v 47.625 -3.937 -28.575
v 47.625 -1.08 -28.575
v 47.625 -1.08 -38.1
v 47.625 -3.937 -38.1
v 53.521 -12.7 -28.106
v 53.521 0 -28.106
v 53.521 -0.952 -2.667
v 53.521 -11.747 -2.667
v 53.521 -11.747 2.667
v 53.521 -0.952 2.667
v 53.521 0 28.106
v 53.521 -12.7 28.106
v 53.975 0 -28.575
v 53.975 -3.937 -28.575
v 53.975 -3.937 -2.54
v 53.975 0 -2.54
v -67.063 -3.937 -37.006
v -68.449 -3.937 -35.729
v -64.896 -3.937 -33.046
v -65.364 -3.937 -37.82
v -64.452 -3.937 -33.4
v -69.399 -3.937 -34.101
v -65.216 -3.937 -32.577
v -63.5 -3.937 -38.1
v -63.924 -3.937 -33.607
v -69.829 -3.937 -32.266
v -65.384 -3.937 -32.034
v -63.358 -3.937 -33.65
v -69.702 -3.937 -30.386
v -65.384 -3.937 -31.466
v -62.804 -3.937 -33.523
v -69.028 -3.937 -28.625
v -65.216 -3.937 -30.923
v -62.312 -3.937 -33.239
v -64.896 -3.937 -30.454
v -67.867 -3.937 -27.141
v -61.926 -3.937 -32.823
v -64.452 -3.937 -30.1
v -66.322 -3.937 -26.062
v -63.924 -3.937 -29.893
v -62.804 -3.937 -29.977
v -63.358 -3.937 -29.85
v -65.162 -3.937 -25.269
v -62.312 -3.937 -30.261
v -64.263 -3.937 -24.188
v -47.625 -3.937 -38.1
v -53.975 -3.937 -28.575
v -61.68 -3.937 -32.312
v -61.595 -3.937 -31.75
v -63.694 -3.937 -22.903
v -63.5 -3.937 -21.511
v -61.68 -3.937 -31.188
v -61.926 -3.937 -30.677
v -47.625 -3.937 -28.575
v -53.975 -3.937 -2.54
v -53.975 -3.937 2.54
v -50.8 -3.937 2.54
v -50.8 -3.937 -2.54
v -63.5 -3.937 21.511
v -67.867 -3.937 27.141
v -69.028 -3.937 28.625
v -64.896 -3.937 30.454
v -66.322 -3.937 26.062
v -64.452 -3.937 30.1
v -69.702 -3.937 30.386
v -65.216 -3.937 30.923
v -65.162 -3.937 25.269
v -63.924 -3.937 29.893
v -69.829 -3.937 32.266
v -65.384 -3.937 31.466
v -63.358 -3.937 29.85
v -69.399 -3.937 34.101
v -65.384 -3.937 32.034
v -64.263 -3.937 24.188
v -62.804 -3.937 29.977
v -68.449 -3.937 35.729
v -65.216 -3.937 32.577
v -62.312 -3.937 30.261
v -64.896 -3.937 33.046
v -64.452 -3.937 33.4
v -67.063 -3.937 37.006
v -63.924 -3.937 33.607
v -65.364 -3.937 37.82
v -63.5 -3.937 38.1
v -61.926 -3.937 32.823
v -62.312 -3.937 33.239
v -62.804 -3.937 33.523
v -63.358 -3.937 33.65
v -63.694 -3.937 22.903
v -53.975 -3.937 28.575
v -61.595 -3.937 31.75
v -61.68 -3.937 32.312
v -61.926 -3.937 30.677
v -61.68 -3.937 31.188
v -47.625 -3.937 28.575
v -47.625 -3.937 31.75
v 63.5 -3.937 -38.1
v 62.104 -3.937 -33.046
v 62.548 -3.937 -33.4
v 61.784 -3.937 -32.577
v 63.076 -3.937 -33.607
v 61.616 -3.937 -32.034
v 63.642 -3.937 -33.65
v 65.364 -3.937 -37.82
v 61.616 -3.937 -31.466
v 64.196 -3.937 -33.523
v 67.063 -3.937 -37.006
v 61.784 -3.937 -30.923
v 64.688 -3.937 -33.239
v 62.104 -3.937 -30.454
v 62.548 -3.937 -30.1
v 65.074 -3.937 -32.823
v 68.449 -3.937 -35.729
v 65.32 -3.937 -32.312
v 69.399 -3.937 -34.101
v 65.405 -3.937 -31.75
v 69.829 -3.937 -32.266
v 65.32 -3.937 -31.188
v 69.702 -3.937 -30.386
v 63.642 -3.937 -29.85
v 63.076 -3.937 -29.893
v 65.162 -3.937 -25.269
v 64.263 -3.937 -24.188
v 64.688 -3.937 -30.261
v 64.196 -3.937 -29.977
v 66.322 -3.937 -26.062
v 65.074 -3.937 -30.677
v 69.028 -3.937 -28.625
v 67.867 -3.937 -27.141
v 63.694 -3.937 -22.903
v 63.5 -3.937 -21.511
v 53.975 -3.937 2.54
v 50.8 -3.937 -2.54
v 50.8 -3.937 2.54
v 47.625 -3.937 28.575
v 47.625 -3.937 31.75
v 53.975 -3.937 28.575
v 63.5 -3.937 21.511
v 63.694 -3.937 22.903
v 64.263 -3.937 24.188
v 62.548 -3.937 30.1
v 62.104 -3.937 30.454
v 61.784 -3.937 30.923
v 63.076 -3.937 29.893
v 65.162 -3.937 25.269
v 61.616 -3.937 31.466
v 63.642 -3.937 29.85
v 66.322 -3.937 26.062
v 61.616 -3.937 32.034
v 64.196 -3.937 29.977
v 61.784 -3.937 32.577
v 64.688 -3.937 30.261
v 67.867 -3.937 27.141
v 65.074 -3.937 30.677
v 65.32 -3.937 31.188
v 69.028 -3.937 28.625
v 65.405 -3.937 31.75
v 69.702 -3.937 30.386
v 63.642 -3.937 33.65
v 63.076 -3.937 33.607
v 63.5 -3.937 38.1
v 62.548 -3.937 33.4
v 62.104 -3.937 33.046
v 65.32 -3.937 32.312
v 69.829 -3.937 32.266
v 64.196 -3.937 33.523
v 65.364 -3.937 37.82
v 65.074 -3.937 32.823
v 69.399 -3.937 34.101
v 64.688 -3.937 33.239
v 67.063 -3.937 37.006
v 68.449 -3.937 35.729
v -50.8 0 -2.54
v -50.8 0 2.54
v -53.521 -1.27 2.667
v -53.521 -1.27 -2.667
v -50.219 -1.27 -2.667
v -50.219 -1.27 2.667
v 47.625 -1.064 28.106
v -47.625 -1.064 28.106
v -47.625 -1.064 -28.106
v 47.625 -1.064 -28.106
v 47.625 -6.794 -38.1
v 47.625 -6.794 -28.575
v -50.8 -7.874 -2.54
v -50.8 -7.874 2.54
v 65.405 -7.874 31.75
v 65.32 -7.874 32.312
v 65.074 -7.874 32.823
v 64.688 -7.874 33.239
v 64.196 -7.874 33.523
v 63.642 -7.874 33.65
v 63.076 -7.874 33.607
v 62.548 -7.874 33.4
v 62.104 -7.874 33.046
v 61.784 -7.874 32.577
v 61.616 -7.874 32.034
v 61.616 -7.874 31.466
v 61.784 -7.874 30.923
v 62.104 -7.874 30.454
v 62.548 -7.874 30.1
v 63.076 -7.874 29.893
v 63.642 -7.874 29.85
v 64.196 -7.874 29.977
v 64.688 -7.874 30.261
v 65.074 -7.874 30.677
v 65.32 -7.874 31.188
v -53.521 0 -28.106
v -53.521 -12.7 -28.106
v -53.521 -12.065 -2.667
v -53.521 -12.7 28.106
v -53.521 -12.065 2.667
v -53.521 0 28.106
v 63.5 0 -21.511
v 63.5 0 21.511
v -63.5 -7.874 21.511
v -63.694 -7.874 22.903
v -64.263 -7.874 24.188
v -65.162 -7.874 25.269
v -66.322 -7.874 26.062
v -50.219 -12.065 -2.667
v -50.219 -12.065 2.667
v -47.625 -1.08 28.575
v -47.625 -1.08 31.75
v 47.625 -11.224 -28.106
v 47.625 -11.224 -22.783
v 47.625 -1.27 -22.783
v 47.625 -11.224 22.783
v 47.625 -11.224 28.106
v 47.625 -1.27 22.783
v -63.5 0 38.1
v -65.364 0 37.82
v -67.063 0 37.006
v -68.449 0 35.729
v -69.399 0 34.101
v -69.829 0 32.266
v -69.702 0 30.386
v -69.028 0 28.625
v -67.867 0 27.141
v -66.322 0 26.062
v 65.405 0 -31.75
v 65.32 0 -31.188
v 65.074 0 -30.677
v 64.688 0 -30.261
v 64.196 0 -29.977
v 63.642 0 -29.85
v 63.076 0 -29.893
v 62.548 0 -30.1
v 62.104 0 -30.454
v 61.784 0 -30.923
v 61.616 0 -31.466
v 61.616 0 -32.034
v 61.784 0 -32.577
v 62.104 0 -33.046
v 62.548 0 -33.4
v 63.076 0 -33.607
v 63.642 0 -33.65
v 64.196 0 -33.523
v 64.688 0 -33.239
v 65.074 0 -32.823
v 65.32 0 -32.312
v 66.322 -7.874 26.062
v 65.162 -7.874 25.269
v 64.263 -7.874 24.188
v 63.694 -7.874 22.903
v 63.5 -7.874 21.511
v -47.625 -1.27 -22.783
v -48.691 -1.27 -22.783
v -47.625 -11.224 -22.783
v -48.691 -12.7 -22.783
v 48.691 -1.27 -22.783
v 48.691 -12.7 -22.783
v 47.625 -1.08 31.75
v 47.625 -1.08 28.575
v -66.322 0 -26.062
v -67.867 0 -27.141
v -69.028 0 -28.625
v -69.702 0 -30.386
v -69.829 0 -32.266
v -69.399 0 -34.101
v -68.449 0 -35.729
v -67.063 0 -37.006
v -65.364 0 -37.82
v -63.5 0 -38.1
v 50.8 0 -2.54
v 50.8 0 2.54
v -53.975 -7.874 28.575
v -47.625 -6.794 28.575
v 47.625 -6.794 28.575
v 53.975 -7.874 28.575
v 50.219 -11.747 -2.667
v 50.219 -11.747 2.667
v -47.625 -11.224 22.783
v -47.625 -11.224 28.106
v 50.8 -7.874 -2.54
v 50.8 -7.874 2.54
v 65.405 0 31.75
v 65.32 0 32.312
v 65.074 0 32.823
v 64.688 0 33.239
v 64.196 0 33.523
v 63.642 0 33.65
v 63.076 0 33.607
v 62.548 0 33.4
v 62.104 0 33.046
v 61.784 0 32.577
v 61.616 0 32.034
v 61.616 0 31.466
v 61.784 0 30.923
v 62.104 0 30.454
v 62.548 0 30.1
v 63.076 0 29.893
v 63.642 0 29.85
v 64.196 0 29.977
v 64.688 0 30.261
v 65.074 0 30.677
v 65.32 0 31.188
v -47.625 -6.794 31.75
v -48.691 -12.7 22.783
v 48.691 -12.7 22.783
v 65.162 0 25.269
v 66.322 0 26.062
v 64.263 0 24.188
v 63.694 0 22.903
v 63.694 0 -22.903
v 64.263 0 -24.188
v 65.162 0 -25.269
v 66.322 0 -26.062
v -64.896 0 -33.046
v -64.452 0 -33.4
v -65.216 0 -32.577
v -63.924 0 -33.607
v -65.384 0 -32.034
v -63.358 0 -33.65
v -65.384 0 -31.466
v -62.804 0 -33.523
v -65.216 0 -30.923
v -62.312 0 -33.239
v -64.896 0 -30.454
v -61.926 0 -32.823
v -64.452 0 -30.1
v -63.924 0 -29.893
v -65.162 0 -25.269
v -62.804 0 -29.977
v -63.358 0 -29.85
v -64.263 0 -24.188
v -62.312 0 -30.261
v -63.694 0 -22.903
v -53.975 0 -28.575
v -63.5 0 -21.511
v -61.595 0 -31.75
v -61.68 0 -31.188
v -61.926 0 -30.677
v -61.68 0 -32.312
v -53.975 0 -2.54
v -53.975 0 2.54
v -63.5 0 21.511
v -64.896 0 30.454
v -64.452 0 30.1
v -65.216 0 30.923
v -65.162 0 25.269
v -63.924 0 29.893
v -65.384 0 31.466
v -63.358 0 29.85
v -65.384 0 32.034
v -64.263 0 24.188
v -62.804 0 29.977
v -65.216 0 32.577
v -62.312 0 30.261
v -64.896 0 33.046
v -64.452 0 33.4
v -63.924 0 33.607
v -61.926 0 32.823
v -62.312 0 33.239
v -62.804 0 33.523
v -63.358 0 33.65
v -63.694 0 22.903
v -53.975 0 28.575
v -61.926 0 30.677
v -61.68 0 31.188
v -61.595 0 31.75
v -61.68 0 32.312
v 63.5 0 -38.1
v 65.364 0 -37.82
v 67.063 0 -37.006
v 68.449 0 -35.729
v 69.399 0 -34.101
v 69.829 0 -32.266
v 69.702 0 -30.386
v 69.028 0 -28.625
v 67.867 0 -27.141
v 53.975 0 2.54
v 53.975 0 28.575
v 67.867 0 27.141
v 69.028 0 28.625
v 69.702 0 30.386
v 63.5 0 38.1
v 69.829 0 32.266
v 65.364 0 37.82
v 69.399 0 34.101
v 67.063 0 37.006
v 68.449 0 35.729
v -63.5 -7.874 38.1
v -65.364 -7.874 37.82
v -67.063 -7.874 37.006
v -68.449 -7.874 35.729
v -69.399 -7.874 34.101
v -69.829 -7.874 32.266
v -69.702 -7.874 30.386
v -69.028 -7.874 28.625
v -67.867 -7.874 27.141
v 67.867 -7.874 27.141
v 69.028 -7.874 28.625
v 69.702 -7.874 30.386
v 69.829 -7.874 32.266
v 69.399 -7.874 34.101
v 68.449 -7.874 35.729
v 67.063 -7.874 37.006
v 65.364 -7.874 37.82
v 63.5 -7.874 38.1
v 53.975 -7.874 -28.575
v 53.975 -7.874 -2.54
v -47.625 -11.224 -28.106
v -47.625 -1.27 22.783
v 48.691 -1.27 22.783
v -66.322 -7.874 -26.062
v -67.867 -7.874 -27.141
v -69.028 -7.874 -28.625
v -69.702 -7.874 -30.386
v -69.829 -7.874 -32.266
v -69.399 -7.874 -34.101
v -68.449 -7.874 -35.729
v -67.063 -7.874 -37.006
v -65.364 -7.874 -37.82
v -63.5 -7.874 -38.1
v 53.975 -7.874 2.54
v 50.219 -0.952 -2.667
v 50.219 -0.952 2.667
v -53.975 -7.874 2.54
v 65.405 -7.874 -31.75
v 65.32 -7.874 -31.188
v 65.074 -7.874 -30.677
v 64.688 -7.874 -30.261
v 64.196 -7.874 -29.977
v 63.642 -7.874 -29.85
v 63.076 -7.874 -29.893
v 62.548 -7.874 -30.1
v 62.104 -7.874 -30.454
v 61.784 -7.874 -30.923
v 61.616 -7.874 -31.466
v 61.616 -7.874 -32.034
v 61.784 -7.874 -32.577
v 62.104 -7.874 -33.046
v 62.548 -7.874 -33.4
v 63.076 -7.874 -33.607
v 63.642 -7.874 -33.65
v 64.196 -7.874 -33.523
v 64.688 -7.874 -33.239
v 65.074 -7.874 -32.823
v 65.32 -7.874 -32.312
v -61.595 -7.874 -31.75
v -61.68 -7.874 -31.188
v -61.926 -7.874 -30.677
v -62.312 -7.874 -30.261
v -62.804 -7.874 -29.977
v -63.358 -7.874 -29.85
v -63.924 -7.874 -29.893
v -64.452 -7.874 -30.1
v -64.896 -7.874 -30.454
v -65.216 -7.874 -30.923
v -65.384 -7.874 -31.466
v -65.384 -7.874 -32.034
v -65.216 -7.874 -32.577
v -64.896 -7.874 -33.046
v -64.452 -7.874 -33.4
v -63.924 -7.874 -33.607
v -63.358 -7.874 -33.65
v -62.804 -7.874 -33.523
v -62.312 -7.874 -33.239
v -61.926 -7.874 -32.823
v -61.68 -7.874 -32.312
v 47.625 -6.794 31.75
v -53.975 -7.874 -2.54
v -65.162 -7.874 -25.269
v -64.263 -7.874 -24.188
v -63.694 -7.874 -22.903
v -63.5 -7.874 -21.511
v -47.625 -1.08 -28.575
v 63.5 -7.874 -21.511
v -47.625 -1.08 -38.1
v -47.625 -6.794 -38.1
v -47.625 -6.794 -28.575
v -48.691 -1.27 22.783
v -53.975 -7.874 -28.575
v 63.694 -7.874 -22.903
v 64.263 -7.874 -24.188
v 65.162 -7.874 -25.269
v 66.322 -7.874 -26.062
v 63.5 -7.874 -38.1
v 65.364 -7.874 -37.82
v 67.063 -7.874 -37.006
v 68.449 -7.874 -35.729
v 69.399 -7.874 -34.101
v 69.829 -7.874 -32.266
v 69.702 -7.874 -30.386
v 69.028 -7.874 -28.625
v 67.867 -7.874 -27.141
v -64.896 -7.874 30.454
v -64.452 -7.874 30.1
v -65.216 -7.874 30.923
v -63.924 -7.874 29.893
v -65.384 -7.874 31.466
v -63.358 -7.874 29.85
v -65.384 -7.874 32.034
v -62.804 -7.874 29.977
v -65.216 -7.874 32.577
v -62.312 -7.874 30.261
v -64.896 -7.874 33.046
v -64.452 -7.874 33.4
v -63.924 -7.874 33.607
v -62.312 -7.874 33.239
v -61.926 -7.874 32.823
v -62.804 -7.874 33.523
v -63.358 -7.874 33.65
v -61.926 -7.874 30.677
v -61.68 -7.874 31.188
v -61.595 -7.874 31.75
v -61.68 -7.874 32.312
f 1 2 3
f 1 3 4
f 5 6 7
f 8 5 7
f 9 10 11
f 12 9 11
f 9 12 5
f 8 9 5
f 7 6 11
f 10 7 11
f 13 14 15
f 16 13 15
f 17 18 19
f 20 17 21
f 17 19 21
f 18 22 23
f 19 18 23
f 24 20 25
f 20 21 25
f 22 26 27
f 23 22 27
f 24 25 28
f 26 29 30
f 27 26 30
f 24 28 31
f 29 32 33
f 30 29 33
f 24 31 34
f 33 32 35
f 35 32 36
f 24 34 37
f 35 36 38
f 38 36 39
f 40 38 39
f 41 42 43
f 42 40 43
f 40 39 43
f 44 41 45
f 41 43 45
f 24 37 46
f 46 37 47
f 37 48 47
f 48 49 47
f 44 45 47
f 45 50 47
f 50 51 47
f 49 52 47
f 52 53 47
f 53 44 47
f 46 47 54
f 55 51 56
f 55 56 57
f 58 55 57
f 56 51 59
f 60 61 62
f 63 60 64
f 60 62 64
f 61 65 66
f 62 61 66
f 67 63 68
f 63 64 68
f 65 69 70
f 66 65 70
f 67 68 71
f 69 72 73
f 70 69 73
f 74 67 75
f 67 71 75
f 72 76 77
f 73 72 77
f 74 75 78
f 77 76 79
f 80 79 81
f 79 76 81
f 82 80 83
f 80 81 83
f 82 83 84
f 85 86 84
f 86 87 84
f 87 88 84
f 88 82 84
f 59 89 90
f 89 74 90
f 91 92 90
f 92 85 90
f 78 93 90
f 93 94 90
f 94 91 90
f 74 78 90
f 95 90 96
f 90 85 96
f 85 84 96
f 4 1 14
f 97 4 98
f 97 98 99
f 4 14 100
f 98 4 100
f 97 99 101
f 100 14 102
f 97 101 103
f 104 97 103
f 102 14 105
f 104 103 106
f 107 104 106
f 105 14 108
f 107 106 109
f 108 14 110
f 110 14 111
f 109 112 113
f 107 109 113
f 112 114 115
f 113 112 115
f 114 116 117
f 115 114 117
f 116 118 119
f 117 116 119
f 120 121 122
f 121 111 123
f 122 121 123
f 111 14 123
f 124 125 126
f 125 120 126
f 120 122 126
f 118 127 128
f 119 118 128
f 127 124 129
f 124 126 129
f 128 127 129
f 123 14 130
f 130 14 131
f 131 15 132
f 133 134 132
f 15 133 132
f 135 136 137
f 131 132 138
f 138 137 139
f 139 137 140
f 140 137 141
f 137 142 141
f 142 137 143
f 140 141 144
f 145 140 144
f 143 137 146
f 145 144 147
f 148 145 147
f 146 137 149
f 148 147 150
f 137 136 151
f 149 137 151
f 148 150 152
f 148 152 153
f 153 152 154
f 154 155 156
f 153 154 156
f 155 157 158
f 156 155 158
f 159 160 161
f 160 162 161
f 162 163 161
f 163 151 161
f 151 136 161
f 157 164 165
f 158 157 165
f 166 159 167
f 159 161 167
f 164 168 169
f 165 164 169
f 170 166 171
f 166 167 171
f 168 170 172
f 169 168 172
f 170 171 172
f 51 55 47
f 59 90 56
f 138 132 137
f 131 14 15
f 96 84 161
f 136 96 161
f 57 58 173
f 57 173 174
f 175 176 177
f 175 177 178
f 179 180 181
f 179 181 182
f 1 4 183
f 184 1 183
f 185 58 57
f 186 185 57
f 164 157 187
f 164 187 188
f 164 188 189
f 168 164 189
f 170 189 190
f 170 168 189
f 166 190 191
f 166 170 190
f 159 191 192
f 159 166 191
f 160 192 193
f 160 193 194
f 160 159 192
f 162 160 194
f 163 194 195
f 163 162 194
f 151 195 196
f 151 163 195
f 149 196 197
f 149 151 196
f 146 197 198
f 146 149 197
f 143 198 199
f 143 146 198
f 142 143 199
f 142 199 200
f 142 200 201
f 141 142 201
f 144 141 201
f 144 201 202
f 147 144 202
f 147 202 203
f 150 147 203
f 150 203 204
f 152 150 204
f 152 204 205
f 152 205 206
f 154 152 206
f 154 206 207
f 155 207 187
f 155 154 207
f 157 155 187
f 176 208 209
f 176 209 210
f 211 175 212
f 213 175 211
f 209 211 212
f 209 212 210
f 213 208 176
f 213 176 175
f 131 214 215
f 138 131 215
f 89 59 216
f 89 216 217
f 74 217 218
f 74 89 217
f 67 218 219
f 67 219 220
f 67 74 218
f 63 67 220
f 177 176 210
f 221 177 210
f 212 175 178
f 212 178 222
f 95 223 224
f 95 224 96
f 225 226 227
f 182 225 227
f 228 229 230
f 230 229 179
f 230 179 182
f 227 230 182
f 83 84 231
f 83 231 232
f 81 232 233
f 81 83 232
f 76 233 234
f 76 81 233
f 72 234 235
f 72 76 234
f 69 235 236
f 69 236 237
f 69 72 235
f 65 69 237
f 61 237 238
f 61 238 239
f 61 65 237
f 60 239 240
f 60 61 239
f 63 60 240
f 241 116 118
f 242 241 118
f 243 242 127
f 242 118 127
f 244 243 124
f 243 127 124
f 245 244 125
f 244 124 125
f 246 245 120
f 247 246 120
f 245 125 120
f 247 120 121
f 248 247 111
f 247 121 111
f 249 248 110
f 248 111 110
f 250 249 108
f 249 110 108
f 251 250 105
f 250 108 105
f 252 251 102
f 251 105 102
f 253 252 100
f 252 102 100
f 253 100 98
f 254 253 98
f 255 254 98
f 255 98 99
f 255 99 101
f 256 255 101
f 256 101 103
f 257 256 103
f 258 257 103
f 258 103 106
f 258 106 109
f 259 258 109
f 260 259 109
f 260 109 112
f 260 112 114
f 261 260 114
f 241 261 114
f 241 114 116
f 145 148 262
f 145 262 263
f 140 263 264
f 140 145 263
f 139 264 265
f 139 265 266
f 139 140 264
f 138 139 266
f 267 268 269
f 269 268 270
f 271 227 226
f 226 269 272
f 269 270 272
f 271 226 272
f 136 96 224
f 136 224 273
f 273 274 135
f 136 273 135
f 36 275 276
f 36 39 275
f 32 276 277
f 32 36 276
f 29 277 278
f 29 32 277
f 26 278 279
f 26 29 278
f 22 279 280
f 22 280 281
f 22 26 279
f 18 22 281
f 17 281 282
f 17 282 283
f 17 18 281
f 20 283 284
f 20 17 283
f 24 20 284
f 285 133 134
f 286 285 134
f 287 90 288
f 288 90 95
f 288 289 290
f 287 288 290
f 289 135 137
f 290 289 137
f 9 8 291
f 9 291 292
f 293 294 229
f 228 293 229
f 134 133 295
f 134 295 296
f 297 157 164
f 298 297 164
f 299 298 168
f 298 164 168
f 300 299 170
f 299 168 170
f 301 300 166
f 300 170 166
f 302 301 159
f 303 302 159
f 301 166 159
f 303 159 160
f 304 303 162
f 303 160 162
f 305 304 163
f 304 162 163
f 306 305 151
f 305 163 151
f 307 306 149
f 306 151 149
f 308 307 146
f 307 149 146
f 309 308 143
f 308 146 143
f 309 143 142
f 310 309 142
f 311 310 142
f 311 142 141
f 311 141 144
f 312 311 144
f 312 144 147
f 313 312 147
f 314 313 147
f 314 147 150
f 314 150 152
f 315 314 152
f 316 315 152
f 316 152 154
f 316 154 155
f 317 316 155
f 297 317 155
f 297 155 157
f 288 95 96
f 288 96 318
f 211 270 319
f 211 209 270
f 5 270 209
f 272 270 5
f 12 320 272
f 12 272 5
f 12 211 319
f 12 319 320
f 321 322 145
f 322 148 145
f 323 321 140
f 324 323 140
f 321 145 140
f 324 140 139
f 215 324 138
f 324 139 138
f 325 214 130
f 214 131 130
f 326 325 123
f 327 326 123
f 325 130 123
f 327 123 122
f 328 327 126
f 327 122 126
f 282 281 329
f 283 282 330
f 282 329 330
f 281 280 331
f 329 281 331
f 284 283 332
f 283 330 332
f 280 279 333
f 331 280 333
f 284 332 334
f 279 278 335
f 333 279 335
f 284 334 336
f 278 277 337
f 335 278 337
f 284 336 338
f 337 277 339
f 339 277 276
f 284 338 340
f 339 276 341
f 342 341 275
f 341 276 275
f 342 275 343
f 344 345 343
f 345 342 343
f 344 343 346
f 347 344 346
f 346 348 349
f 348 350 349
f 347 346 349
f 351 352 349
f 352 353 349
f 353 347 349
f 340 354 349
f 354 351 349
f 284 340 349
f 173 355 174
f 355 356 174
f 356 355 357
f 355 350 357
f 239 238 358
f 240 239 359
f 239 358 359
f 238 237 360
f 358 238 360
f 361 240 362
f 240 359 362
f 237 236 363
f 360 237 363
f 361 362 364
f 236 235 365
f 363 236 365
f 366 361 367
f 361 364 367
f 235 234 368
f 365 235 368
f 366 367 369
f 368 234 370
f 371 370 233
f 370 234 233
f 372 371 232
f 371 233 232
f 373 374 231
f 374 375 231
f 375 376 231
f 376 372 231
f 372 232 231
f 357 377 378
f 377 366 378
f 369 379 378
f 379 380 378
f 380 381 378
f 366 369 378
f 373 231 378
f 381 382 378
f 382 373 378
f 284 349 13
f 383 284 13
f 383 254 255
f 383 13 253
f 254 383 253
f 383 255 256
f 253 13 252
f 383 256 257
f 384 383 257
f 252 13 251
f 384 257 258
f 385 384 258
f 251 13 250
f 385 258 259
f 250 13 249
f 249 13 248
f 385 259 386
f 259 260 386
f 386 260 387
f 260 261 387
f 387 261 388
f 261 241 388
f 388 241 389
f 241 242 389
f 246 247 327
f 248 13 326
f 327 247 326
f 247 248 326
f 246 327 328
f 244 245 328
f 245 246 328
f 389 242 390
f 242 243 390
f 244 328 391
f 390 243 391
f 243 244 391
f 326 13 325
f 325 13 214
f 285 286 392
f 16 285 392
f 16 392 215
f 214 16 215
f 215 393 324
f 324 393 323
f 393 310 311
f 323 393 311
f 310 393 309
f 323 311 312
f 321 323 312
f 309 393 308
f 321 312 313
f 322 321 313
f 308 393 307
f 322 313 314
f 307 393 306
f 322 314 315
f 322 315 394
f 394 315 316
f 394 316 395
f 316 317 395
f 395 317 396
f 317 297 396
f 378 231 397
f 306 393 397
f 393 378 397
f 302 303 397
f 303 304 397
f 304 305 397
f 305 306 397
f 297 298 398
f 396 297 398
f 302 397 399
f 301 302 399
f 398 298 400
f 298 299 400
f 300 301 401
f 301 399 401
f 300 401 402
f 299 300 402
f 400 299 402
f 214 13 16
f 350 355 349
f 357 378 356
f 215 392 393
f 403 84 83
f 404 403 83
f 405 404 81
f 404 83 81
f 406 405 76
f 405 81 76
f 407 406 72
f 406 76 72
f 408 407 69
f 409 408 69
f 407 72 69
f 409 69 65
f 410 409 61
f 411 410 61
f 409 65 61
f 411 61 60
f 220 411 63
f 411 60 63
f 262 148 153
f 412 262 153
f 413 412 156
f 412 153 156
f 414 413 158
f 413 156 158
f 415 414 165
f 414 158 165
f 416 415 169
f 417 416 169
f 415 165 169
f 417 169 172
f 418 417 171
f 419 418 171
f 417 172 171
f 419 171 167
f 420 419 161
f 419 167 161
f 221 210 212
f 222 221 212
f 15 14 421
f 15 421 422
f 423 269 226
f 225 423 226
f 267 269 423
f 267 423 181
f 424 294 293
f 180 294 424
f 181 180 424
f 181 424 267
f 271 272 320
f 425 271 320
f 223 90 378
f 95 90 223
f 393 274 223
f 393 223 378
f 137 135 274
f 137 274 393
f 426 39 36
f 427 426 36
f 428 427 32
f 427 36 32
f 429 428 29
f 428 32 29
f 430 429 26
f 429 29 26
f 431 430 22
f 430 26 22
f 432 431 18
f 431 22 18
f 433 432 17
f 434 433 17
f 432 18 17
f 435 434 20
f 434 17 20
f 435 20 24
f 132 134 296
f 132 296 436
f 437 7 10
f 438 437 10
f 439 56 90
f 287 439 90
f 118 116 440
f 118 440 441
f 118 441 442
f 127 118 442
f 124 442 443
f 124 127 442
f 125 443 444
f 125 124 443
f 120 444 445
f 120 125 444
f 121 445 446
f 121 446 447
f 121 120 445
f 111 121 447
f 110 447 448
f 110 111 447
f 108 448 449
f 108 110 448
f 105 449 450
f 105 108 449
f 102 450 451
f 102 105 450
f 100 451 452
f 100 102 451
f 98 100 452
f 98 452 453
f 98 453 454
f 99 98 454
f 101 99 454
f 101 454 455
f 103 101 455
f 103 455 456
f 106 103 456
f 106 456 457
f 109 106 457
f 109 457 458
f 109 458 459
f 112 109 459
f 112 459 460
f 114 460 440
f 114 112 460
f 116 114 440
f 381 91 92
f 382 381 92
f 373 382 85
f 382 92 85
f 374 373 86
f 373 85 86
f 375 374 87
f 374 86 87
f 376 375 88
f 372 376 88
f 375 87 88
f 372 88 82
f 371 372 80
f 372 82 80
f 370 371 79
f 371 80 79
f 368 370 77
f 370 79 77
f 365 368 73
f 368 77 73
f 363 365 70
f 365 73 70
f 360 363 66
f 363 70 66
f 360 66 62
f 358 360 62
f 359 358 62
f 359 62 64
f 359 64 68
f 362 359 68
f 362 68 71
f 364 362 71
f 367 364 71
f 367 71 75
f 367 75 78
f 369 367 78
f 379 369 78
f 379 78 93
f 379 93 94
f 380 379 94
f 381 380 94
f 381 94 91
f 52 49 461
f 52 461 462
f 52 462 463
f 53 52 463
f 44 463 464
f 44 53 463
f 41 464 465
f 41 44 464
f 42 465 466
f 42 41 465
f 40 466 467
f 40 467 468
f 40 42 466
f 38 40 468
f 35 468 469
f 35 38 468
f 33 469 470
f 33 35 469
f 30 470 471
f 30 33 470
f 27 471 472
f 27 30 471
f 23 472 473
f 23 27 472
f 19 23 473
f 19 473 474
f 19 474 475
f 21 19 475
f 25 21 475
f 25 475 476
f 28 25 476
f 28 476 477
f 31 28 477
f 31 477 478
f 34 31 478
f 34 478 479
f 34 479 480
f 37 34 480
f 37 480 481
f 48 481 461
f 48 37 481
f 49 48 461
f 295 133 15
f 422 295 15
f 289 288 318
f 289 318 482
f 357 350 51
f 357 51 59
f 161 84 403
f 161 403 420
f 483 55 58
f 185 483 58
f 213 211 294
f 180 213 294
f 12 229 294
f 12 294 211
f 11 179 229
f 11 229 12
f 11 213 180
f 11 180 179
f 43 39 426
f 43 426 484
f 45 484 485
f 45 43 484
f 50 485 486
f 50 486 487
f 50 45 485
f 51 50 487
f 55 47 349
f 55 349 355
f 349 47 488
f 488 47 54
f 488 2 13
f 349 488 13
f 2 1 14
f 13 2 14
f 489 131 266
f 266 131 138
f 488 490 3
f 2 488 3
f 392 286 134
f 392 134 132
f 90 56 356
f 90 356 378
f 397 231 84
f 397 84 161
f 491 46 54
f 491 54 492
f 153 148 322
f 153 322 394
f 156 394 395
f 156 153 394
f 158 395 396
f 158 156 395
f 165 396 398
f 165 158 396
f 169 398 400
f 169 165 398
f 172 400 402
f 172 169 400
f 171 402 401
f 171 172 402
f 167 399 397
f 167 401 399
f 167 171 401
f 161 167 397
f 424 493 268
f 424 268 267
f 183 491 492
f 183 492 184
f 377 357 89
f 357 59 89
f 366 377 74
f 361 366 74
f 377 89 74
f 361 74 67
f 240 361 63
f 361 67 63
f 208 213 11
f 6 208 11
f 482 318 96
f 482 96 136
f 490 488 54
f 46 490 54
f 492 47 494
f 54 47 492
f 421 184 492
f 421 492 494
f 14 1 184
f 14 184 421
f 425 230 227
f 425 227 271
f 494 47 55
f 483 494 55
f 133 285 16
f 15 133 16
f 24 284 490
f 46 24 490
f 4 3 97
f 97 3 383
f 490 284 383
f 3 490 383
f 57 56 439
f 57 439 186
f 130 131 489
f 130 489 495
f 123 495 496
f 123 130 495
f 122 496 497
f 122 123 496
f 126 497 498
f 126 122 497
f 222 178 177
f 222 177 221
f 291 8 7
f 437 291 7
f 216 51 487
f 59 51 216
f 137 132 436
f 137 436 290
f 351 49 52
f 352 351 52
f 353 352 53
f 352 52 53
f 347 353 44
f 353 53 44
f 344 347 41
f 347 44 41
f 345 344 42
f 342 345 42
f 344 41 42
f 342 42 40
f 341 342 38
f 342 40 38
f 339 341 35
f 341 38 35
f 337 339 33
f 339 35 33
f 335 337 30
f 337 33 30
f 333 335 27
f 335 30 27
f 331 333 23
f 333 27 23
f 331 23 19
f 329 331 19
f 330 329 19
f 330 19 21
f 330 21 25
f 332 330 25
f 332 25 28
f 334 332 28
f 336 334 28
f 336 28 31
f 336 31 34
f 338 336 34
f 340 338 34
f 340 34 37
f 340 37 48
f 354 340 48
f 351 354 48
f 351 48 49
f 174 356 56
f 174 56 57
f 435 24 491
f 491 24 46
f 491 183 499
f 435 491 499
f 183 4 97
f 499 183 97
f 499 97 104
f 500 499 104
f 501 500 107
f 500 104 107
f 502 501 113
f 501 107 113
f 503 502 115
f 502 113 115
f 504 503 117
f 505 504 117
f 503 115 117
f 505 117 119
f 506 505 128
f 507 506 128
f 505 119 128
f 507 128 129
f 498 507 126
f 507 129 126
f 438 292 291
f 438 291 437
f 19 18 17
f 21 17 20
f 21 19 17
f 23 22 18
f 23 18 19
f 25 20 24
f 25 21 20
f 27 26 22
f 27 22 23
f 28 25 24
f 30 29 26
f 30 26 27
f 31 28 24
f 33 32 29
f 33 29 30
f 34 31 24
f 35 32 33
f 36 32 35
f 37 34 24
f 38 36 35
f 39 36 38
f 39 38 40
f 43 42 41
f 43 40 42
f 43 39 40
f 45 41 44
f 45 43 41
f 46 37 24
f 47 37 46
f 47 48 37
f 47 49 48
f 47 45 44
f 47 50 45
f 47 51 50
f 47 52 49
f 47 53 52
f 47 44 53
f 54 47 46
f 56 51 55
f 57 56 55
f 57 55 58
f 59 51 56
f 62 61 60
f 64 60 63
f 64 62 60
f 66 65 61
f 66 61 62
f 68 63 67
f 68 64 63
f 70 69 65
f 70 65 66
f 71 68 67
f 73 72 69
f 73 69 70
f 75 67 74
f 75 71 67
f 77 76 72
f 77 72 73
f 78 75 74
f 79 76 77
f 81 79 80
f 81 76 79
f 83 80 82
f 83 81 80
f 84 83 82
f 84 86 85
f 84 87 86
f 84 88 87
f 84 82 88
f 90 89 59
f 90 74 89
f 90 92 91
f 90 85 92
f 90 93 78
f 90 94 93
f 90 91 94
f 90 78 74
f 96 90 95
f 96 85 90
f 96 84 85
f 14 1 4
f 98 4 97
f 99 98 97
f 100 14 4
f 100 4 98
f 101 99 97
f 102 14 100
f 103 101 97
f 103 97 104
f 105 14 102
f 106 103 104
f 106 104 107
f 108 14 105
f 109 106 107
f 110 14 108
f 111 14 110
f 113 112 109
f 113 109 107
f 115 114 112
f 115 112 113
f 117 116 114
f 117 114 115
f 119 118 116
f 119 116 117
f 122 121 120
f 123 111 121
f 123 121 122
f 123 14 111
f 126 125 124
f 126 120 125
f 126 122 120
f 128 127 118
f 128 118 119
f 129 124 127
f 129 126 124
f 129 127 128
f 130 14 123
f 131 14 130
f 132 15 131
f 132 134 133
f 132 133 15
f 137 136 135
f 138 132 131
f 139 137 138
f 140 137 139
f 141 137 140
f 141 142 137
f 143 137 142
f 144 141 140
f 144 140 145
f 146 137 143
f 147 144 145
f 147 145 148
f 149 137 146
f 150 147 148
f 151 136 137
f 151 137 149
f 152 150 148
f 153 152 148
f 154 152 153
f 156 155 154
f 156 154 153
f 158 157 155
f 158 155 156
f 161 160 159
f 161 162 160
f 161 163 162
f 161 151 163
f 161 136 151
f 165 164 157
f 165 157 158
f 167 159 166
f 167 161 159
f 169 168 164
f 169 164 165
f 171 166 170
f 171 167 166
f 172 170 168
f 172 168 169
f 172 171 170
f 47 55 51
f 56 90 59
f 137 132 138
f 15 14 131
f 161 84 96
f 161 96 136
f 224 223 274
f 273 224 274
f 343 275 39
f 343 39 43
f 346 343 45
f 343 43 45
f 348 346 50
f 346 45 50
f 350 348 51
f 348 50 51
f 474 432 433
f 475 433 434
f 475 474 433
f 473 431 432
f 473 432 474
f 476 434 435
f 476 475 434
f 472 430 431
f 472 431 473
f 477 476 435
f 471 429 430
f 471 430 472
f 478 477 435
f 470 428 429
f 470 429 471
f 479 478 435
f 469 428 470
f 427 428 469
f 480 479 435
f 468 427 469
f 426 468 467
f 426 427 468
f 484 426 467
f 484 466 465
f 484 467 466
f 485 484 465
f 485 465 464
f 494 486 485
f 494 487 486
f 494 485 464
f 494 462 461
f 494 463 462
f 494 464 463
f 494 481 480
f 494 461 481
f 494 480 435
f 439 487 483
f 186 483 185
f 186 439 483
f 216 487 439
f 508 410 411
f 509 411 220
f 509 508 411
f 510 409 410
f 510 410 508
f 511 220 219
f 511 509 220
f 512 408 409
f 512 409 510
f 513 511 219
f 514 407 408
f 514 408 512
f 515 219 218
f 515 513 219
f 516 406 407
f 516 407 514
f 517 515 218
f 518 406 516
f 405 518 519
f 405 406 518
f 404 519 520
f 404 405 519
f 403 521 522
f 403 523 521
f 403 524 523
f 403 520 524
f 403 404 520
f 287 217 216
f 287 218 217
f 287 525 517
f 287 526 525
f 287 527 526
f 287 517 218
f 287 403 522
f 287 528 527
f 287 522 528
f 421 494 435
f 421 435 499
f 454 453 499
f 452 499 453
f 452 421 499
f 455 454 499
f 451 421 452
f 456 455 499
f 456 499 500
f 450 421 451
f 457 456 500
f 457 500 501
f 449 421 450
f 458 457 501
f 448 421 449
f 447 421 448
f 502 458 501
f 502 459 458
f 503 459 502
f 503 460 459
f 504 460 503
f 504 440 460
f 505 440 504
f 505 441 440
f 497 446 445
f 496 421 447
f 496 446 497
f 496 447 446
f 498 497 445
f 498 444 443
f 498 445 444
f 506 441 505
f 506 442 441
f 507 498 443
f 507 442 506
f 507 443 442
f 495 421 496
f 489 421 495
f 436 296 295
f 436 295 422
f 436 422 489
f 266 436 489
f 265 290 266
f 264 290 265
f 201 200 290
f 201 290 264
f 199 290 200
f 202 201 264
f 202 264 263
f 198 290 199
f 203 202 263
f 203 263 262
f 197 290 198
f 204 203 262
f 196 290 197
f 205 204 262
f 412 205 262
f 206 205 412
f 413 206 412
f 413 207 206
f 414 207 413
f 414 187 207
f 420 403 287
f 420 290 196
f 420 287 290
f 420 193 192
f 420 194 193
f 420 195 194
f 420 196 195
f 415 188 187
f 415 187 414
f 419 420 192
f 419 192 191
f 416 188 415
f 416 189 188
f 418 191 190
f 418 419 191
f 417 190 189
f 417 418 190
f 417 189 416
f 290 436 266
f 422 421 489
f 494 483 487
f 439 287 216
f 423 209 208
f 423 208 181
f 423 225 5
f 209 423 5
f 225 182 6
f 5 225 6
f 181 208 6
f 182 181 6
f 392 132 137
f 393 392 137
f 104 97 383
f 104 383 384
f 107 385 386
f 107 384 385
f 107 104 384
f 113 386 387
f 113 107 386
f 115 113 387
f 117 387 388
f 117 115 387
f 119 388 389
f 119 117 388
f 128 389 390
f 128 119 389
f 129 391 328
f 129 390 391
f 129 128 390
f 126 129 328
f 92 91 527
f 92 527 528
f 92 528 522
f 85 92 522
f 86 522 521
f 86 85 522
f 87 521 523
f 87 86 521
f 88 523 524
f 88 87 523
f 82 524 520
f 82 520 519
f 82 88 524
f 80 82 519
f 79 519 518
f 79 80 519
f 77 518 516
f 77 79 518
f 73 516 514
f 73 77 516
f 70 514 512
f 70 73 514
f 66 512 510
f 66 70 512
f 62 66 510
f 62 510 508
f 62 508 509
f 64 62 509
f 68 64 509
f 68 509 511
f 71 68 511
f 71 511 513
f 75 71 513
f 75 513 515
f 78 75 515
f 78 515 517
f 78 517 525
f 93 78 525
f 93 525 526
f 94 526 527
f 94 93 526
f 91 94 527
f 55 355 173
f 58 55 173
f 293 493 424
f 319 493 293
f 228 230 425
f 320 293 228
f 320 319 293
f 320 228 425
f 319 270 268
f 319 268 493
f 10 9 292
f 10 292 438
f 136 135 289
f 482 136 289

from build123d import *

# Parameters (mm, degrees)
F0_W      = 127
F0_H      = 76.2
F1_DEPTH  = 3.937
F2_W      = 107.95
F2_H      = 57.15
F3_DEPTH  = 25.4
F4_R      = 6.35
F5_DEPTH  = 3.937
F6_R      = 5.08
F7_R      = 1.905
F8_DEPTH  = 25.4
F9_W      = 3.175
F9_H      = 5.08
F10_DEPTH = 3.937
F11_DEPTH = 3.937
F12_W     = 95.25
F12_H     = 5.715
F13_DEPTH = 69.85
F14_W     = 107.0417910814
F14_H     = 56.2123097479
F15_DEPTH = 12.7
F16_W     = 97.3812863231
F16_H     = 45.5662533641
F17_DEPTH = 11.43
F18_W     = 95.25
F18_H     = 10.16
F19_DEPTH = 65.278
F20_W     = 10.795
F20_H     = 5.334
F21_DEPTH = 3.302
F22_W     = 10.795
F22_H     = 5.334
F23_DEPTH = 3.302


with BuildPart() as f1:
    # F0 (on Front) → F1 (new body)
    with BuildSketch(Plane.XZ):
        Rectangle(F0_W, F0_H)
    extrude(amount=F1_DEPTH)

    # F2 (on face) → F3 (cut)
    with BuildSketch(Plane.XZ.offset(3.937)):
        Rectangle(F2_W, F2_H)
    extrude(amount=-F3_DEPTH, mode=Mode.SUBTRACT)

    # F4 (on face) → F5 (join)
    with BuildSketch(Plane.XZ.offset(3.937)):
        with Locations((-63.5, 31.75)):
            Circle(F4_R)
        with Locations((63.5, 31.75)):
            Circle(F4_R)
        with Locations((-63.5, -31.75)):
            Circle(F4_R)
        with Locations((63.5, -31.75)):
            Circle(F4_R)
    extrude(amount=-F5_DEPTH)

    # F6
    f6_edges = [f1.edges().sort_by_distance(p)[0] for p in [
        (-63.5, -1.9685, 25.4),
        (-63.5, -1.9685, -25.4),
        (63.5, -1.9685, 25.4),
        (63.5, -1.9685, -25.4),
    ]]
    fillet(f6_edges, radius=F6_R)

    # F7 (on face) → F8 (cut)
    with BuildSketch(Plane.XZ.offset(3.937)):
        with Locations((-63.5, 31.75)):
            Circle(F7_R)
        with Locations((-63.5, -31.75)):
            Circle(F7_R)
        with Locations((63.5, -31.75)):
            Circle(F7_R)
        with Locations((63.5, 31.75)):
            Circle(F7_R)
    extrude(amount=-F8_DEPTH, mode=Mode.SUBTRACT)

    # F9 (on face) → F10 (join)
    with BuildSketch(Plane.XZ.offset(3.937)):
        with Locations((-52.3875, 0)):
            Rectangle(F9_W, F9_H)
        with Locations((52.3875, 0)):
            Rectangle(F9_W, F9_H)
    extrude(amount=-F10_DEPTH)


with BuildPart() as f11:
    # F11 (new): a face of the model
    f11_faces = [f1.part.faces().sort_by_distance(p)[0] for p in [
        (-61.9086945611, -3.937, 0),
    ]]
    extrude(f11_faces, amount=F11_DEPTH)


with BuildPart() as f13_tool:
    # F12 (on face) → F13 (new body)
    with BuildSketch(Plane(origin=(0, 0, -38.1), x_dir=(1, 0, 0), z_dir=(0, 0, -1))):
        with Locations((0, 3.937)):
            Rectangle(F12_W, F12_H)
    extrude(amount=-F13_DEPTH)


with BuildPart() as f1_1:
    add(f1.part)

    # F13: cut by f13_tool
    add(f13_tool.part, mode=Mode.SUBTRACT)


with BuildPart() as f11_1:
    add(f11.part)

    # F13: cut by f13_tool
    add(f13_tool.part, mode=Mode.SUBTRACT)


with BuildPart() as f15:
    # F14 (on Front) → F15 (new body)
    with BuildSketch(Plane.XZ):
        Rectangle(F14_W, F14_H)
    extrude(amount=F15_DEPTH)

    # F16 (on face) → F17 (cut)
    with BuildSketch(Plane.XZ.offset(12.7)):
        Rectangle(F16_W, F16_H)
    extrude(amount=-F17_DEPTH, mode=Mode.SUBTRACT)

    # F18 (on face) → F19 (cut)
    with BuildSketch(Plane.XY.offset(28.106154874)):
        with Locations((0, -6.1444608298)):
            Rectangle(F18_W, F18_H)
    extrude(amount=-F19_DEPTH, mode=Mode.SUBTRACT)

    # F20 (on face) → F21 (cut)
    with BuildSketch(Plane.YZ.offset(53.5208955407)):
        with Locations((-6.35, 0)):
            Rectangle(F20_W, F20_H)
    extrude(amount=-F21_DEPTH, mode=Mode.SUBTRACT)

    # F22 (on face) → F23 (cut)
    with BuildSketch(Plane(origin=(-53.5208955407, 0, 0), x_dir=(0, -1, 0), z_dir=(-1, 0, 0))):
        with Locations((6.6675, 0)):
            Rectangle(F22_W, F22_H)
    extrude(amount=-F23_DEPTH, mode=Mode.SUBTRACT)


solid = Compound([f1_1.part, f11_1.part, f15.part])
